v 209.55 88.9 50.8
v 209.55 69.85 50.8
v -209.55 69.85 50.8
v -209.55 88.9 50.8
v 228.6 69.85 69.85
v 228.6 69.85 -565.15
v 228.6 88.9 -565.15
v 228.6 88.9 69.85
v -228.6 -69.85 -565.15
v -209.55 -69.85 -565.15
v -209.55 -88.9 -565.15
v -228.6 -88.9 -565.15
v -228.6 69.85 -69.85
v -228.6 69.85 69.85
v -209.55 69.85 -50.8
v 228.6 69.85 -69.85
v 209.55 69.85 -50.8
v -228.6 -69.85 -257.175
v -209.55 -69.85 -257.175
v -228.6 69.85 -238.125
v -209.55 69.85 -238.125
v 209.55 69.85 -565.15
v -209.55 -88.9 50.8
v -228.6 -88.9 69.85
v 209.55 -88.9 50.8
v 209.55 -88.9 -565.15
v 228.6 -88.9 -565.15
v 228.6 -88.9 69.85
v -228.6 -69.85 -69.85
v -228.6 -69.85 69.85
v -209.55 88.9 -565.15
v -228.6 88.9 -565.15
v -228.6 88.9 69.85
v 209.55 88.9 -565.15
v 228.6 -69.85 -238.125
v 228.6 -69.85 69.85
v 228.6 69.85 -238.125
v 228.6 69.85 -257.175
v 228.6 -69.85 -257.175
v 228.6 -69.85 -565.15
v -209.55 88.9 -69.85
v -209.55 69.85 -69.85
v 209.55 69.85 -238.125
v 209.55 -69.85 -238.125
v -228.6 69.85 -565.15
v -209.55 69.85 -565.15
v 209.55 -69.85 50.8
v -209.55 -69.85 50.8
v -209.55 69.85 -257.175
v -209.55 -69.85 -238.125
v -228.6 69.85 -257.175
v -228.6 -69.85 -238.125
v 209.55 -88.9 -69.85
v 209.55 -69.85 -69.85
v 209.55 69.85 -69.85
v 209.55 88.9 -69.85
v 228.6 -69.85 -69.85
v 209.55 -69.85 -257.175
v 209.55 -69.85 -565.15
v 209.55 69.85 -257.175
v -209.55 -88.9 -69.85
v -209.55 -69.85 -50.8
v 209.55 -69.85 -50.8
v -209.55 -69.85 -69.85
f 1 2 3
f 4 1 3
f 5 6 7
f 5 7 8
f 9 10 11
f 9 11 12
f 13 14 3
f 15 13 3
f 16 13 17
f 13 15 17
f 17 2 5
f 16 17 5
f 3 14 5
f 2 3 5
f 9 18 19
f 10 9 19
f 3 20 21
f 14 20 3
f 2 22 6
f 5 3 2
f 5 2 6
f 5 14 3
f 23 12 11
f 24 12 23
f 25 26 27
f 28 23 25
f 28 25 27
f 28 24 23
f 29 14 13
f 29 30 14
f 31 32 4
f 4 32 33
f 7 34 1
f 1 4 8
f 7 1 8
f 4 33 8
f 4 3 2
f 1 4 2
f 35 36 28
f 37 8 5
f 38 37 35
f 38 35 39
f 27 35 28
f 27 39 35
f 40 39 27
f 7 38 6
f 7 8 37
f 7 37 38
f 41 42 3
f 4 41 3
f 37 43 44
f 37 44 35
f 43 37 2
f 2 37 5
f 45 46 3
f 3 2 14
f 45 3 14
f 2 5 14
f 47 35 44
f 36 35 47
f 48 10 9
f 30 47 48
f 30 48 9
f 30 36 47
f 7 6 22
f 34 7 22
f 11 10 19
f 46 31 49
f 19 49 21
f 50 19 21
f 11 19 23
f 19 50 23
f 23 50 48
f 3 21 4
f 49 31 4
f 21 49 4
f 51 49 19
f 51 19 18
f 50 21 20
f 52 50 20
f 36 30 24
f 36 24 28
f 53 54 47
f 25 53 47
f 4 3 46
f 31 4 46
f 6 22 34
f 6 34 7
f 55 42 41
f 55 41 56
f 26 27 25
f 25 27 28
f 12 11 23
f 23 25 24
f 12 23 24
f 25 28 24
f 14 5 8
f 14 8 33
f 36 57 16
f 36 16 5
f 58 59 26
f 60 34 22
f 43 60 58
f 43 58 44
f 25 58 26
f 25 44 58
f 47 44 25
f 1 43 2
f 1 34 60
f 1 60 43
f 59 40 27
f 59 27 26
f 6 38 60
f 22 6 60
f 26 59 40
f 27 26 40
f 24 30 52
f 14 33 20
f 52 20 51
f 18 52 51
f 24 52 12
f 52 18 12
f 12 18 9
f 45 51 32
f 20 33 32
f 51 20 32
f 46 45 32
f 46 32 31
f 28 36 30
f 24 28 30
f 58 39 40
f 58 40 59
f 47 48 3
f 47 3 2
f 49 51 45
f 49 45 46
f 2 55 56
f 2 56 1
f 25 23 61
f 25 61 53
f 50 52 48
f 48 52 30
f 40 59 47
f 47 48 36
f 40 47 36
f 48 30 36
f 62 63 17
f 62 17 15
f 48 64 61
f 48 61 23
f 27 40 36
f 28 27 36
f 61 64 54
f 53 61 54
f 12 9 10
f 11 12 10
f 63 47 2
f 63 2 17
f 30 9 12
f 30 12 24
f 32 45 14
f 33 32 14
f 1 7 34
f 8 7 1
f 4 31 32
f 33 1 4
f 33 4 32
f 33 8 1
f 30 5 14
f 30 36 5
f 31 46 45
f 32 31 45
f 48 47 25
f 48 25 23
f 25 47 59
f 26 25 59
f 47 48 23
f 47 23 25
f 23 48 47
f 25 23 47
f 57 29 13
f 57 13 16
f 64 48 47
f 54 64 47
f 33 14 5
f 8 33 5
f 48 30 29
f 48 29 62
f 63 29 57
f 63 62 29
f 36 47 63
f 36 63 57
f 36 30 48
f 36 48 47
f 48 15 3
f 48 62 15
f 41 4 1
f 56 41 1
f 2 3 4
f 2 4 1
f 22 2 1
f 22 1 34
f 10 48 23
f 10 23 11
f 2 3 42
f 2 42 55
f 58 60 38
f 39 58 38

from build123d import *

# Parameters (mm, degrees)
F1_DEPTH = 69.85
F3_DEPTH = 19.05
F5_W     = 419.1
F5_H     = 120.65
F6_DEPTH = 19.05
F8_W     = 19.05
F8_H     = 19.05
F9_DEPTH = 139.7


with BuildPart() as f1:
    # F0 (on Front) → F1 (new body, symmetric)
    with BuildSketch(Plane.XZ):
        Polygon((-209.55, 50.8), (-228.6, 69.85), (-228.6, -69.85), (-209.55, -50.8), align=None)
        Polygon((228.6, 69.85), (-228.6, 69.85), (-209.55, 50.8), (209.55, 50.8), align=None)
        Polygon((228.6, -69.85), (228.6, 69.85), (209.55, 50.8), (209.55, -50.8), align=None)
        Polygon((-209.55, -50.8), (-228.6, -69.85), (228.6, -69.85), (209.55, -50.8), align=None)
    extrude(amount=F1_DEPTH, both=True)


with BuildPart() as f3:
    # F2 (on face) → F3 (new body)
    with BuildSketch(Plane(origin=(0, 69.85, 0), x_dir=(-1, 0, 0), z_dir=(0, 1, 0))):
        Polygon((228.6, 69.85), (-228.6, 69.85), (-209.55, 50.8), (209.55, 50.8), align=None)
        Polygon((-209.55, 50.8), (-228.6, 69.85), (-228.6, -565.15), (-209.55, -565.15), align=None)
        Polygon((228.6, -565.15), (228.6, 69.85), (209.55, 50.8), (209.55, -565.15), align=None)
    extrude(amount=F3_DEPTH)


with BuildPart() as f4_1:
    # F4: instance of F3
    add(f3.part.mirror(Plane.XZ))


with BuildPart() as f6:
    # F5 (on face) → F6 (new body)
    with BuildSketch(Plane.XZ.offset(69.85)):
        with Locations((0, -9.525)):
            Rectangle(F5_W, F5_H)
    extrude(amount=F6_DEPTH)


with BuildPart() as f7_1:
    # F7: instance of F6
    add(f6.part.mirror(Plane.XZ))


with BuildPart() as f3_1:
    add(f3.part)

    add(f4_1.part)  # F9 merges F4_1
    # F8 (on face) → F9 (join, through all)
    with BuildSketch(Plane.XZ.offset(-69.85)):
        with Locations((219.075, -247.65)):
            Rectangle(F8_W, F8_H)
    extrude(amount=F9_DEPTH)


with BuildPart() as f10_1:
    # F10: instance of F3
    add(f3_1.part.mirror(Plane.YZ))


solid = Compound([f1.part, f6.part, f7_1.part, f3_1.part, f10_1.part])
